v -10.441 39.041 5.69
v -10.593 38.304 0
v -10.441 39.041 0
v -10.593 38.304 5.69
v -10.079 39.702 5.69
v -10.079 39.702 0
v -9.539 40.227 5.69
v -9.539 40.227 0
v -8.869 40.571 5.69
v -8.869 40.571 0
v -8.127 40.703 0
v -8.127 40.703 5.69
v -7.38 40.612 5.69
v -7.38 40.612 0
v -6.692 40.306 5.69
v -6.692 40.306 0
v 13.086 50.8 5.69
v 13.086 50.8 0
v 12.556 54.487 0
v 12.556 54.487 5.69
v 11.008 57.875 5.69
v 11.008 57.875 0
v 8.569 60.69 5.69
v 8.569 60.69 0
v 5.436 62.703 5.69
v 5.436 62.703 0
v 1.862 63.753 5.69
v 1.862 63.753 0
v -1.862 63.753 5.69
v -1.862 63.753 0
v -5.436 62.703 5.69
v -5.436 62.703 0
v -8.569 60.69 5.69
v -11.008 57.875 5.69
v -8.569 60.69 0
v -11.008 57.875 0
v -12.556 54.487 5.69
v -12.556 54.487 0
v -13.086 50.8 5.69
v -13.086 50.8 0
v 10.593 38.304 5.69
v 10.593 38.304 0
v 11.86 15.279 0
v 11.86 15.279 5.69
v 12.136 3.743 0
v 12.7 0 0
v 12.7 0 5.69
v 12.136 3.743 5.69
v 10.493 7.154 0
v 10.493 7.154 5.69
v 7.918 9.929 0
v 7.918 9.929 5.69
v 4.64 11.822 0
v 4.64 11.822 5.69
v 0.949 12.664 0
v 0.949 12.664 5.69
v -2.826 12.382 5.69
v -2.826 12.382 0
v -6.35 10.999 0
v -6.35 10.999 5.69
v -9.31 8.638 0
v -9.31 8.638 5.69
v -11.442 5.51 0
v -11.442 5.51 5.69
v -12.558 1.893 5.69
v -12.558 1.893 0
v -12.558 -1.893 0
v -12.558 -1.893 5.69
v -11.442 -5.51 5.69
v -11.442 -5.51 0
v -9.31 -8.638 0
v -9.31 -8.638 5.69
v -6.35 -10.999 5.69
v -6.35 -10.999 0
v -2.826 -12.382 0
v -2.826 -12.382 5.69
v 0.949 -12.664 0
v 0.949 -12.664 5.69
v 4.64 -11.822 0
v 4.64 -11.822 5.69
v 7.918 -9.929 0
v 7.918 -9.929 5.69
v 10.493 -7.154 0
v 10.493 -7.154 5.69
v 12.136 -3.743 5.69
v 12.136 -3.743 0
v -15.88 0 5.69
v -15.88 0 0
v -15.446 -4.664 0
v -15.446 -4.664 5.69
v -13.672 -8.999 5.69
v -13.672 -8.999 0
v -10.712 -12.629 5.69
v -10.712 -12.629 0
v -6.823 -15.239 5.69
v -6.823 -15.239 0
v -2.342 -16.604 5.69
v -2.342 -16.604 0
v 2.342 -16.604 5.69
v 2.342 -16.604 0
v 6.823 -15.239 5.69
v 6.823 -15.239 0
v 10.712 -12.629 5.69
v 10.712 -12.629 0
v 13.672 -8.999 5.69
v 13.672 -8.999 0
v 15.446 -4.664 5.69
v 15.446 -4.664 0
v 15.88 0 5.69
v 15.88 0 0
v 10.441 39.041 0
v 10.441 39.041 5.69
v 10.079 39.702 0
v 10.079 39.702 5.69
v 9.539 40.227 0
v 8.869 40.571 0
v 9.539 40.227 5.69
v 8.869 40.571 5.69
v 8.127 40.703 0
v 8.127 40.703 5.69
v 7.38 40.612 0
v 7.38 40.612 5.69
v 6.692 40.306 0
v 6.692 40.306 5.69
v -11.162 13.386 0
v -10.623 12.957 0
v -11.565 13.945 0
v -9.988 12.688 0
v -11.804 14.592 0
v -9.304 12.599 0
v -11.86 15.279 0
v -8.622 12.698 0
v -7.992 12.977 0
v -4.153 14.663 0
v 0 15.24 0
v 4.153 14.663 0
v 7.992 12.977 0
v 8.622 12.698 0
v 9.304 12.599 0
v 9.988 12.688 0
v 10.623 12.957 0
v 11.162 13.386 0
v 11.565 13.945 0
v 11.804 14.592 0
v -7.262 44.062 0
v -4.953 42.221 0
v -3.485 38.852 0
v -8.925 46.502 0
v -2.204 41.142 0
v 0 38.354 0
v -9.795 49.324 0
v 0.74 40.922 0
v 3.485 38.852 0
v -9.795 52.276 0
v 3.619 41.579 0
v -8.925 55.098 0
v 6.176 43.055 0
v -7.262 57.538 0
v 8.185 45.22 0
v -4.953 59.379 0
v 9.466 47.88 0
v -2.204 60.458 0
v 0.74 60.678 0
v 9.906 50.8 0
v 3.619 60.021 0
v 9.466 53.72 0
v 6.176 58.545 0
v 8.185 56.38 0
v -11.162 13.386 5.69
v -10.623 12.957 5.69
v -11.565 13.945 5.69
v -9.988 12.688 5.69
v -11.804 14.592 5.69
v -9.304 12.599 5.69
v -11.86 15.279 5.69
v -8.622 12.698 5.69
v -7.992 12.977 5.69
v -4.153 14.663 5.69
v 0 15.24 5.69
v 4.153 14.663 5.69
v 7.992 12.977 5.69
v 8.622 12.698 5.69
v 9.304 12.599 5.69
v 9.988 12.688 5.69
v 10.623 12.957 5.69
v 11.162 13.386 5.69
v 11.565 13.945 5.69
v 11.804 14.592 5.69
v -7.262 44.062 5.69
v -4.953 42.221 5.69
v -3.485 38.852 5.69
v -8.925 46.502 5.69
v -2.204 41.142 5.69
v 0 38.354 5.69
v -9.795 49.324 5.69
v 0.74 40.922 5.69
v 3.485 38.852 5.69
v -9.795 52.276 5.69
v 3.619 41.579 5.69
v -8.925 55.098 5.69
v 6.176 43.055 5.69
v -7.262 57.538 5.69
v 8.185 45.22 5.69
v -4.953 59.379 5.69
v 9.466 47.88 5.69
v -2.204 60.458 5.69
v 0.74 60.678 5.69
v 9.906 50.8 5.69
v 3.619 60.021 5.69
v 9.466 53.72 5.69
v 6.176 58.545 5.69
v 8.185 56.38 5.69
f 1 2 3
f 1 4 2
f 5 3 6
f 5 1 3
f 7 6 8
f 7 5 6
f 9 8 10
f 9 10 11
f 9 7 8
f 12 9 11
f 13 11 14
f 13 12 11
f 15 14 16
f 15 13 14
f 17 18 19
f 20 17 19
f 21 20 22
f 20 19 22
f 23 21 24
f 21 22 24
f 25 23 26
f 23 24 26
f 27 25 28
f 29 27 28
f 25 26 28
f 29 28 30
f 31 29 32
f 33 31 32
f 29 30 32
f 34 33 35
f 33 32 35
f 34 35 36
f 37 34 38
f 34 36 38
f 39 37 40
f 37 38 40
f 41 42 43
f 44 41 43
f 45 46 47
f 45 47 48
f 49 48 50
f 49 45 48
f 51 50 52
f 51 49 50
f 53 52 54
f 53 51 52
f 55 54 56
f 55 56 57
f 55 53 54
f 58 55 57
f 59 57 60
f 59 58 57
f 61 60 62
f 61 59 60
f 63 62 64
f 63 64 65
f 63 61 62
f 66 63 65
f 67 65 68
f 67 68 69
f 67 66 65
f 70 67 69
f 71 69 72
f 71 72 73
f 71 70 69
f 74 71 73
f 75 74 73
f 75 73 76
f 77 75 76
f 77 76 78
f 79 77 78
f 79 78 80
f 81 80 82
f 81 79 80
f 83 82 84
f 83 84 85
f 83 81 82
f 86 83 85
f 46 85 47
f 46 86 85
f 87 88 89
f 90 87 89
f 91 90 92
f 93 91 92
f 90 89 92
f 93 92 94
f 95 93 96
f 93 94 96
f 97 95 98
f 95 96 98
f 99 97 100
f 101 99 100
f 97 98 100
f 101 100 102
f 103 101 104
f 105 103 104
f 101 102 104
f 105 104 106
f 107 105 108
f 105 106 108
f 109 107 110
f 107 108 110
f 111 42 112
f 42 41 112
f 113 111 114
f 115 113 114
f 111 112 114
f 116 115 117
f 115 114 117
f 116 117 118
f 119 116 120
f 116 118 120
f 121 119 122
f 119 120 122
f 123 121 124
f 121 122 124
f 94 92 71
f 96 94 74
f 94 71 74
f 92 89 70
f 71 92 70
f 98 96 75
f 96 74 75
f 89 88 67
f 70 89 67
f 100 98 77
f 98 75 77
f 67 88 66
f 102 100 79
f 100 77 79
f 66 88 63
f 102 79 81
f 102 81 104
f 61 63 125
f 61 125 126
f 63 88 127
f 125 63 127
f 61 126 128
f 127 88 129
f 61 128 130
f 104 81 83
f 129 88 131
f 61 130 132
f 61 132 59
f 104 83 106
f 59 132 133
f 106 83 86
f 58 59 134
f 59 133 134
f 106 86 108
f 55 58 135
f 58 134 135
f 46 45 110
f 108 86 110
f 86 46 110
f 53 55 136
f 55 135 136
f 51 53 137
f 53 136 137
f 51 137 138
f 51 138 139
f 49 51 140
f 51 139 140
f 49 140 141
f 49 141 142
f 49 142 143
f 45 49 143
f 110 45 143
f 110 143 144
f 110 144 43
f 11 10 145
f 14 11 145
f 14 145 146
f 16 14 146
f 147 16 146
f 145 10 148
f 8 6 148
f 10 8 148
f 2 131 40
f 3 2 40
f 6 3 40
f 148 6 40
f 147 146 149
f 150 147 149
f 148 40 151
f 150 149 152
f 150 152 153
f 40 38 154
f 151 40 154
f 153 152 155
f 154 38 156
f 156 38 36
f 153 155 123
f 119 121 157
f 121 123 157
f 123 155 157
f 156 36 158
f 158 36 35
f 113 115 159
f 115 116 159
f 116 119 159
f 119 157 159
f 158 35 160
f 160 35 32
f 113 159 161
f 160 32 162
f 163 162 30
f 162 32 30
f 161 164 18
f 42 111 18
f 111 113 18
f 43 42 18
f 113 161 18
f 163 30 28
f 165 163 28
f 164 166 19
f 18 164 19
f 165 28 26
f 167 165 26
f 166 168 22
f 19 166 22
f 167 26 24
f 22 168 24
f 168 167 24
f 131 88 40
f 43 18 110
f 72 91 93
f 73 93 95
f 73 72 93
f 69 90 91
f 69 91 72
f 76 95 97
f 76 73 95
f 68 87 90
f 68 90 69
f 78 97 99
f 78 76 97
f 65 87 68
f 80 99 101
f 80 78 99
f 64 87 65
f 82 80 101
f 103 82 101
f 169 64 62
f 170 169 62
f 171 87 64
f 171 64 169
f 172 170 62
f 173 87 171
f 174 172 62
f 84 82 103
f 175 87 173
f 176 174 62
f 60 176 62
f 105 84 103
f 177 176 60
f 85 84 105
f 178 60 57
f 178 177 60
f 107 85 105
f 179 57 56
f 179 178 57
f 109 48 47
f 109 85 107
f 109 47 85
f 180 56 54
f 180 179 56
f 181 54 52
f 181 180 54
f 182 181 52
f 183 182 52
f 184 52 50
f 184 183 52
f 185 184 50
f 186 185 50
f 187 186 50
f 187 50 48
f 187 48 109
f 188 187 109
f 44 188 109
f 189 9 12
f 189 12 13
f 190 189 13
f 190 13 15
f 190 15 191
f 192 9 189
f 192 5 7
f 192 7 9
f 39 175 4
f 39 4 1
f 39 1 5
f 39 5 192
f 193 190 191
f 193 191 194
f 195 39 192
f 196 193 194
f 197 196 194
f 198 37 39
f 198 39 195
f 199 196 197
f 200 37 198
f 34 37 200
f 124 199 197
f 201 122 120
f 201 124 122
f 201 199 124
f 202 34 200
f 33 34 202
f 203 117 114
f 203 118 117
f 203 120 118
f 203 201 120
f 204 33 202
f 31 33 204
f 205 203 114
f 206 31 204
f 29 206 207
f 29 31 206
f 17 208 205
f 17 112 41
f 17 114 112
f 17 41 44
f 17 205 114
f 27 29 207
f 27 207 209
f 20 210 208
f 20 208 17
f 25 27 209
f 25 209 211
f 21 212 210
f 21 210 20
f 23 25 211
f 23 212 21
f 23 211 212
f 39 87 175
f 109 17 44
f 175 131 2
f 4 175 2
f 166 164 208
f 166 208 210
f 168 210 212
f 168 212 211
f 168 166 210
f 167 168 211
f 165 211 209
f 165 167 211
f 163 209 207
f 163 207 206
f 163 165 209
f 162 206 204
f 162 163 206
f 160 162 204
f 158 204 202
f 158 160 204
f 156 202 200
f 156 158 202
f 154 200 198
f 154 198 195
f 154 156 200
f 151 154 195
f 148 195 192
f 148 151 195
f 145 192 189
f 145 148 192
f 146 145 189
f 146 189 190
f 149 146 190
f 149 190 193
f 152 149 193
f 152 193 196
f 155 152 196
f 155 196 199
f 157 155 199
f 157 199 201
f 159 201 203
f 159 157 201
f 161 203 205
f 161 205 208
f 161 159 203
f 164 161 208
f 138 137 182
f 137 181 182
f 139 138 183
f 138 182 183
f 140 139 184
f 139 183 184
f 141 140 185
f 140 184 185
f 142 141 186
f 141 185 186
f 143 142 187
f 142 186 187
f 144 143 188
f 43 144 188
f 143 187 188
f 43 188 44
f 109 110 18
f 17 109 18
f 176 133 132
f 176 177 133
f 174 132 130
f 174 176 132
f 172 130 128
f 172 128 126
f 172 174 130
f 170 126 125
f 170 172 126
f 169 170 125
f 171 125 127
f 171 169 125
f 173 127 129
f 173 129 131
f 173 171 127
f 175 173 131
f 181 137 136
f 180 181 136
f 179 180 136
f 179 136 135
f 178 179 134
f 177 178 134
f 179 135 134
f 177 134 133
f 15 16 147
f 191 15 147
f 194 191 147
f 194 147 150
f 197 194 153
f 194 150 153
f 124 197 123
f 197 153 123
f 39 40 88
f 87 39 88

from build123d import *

# Parameters (mm, degrees)
SKETCH1_R           = 9.906
SKETCH1_R_2         = 12.7
BOSS_EXTRUDE1_DEPTH = 5.6896
FILLET1_R           = 2.54


with BuildPart() as part:
    # Sketch1 → Boss-Extrude1 (new body)
    with BuildSketch(Plane.XY):
        with BuildLine():
            ThreePointArc((13.085798561, 50.8), (0, 63.885798561), (-13.085798561, 50.8))
            Line((-13.085798561, 50.8), (-15.879798561, 0))
            ThreePointArc((-15.879798561, 0), (0, -16.777187541), (15.879798561, 0))
            Line((15.879798561, 0), (13.085798561, 50.8))
        make_face()
        with BuildLine():
            Line((-12.197482286, 9.136685717), (-10.290993585, 43.800116641))
            ThreePointArc((-10.290993585, 43.800116641), (0, 38.354), (10.290993585, 43.800116641))
            Line((10.290993585, 43.800116641), (12.197482286, 9.136685717))
            ThreePointArc((12.197482286, 9.136685717), (0, 15.24), (-12.197482286, 9.136685717))
        make_face(mode=Mode.SUBTRACT)
        with Locations((0, 50.8)):
            Circle(SKETCH1_R, mode=Mode.SUBTRACT)
        Circle(SKETCH1_R_2, mode=Mode.SUBTRACT)
    extrude(amount=BOSS_EXTRUDE1_DEPTH)

    # Fillet1
    fillet1_edges = [part.edges().sort_by_distance(p)[0] for p in [
        (-10.290993585, 43.800116641, 2.8448),
        (-12.197482286, 9.136685717, 2.8448),
        (12.197482286, 9.136685717, 2.8448),
        (10.290993585, 43.800116641, 2.8448),
    ]]
    fillet(fillet1_edges, radius=FILLET1_R)


solid = part.part
